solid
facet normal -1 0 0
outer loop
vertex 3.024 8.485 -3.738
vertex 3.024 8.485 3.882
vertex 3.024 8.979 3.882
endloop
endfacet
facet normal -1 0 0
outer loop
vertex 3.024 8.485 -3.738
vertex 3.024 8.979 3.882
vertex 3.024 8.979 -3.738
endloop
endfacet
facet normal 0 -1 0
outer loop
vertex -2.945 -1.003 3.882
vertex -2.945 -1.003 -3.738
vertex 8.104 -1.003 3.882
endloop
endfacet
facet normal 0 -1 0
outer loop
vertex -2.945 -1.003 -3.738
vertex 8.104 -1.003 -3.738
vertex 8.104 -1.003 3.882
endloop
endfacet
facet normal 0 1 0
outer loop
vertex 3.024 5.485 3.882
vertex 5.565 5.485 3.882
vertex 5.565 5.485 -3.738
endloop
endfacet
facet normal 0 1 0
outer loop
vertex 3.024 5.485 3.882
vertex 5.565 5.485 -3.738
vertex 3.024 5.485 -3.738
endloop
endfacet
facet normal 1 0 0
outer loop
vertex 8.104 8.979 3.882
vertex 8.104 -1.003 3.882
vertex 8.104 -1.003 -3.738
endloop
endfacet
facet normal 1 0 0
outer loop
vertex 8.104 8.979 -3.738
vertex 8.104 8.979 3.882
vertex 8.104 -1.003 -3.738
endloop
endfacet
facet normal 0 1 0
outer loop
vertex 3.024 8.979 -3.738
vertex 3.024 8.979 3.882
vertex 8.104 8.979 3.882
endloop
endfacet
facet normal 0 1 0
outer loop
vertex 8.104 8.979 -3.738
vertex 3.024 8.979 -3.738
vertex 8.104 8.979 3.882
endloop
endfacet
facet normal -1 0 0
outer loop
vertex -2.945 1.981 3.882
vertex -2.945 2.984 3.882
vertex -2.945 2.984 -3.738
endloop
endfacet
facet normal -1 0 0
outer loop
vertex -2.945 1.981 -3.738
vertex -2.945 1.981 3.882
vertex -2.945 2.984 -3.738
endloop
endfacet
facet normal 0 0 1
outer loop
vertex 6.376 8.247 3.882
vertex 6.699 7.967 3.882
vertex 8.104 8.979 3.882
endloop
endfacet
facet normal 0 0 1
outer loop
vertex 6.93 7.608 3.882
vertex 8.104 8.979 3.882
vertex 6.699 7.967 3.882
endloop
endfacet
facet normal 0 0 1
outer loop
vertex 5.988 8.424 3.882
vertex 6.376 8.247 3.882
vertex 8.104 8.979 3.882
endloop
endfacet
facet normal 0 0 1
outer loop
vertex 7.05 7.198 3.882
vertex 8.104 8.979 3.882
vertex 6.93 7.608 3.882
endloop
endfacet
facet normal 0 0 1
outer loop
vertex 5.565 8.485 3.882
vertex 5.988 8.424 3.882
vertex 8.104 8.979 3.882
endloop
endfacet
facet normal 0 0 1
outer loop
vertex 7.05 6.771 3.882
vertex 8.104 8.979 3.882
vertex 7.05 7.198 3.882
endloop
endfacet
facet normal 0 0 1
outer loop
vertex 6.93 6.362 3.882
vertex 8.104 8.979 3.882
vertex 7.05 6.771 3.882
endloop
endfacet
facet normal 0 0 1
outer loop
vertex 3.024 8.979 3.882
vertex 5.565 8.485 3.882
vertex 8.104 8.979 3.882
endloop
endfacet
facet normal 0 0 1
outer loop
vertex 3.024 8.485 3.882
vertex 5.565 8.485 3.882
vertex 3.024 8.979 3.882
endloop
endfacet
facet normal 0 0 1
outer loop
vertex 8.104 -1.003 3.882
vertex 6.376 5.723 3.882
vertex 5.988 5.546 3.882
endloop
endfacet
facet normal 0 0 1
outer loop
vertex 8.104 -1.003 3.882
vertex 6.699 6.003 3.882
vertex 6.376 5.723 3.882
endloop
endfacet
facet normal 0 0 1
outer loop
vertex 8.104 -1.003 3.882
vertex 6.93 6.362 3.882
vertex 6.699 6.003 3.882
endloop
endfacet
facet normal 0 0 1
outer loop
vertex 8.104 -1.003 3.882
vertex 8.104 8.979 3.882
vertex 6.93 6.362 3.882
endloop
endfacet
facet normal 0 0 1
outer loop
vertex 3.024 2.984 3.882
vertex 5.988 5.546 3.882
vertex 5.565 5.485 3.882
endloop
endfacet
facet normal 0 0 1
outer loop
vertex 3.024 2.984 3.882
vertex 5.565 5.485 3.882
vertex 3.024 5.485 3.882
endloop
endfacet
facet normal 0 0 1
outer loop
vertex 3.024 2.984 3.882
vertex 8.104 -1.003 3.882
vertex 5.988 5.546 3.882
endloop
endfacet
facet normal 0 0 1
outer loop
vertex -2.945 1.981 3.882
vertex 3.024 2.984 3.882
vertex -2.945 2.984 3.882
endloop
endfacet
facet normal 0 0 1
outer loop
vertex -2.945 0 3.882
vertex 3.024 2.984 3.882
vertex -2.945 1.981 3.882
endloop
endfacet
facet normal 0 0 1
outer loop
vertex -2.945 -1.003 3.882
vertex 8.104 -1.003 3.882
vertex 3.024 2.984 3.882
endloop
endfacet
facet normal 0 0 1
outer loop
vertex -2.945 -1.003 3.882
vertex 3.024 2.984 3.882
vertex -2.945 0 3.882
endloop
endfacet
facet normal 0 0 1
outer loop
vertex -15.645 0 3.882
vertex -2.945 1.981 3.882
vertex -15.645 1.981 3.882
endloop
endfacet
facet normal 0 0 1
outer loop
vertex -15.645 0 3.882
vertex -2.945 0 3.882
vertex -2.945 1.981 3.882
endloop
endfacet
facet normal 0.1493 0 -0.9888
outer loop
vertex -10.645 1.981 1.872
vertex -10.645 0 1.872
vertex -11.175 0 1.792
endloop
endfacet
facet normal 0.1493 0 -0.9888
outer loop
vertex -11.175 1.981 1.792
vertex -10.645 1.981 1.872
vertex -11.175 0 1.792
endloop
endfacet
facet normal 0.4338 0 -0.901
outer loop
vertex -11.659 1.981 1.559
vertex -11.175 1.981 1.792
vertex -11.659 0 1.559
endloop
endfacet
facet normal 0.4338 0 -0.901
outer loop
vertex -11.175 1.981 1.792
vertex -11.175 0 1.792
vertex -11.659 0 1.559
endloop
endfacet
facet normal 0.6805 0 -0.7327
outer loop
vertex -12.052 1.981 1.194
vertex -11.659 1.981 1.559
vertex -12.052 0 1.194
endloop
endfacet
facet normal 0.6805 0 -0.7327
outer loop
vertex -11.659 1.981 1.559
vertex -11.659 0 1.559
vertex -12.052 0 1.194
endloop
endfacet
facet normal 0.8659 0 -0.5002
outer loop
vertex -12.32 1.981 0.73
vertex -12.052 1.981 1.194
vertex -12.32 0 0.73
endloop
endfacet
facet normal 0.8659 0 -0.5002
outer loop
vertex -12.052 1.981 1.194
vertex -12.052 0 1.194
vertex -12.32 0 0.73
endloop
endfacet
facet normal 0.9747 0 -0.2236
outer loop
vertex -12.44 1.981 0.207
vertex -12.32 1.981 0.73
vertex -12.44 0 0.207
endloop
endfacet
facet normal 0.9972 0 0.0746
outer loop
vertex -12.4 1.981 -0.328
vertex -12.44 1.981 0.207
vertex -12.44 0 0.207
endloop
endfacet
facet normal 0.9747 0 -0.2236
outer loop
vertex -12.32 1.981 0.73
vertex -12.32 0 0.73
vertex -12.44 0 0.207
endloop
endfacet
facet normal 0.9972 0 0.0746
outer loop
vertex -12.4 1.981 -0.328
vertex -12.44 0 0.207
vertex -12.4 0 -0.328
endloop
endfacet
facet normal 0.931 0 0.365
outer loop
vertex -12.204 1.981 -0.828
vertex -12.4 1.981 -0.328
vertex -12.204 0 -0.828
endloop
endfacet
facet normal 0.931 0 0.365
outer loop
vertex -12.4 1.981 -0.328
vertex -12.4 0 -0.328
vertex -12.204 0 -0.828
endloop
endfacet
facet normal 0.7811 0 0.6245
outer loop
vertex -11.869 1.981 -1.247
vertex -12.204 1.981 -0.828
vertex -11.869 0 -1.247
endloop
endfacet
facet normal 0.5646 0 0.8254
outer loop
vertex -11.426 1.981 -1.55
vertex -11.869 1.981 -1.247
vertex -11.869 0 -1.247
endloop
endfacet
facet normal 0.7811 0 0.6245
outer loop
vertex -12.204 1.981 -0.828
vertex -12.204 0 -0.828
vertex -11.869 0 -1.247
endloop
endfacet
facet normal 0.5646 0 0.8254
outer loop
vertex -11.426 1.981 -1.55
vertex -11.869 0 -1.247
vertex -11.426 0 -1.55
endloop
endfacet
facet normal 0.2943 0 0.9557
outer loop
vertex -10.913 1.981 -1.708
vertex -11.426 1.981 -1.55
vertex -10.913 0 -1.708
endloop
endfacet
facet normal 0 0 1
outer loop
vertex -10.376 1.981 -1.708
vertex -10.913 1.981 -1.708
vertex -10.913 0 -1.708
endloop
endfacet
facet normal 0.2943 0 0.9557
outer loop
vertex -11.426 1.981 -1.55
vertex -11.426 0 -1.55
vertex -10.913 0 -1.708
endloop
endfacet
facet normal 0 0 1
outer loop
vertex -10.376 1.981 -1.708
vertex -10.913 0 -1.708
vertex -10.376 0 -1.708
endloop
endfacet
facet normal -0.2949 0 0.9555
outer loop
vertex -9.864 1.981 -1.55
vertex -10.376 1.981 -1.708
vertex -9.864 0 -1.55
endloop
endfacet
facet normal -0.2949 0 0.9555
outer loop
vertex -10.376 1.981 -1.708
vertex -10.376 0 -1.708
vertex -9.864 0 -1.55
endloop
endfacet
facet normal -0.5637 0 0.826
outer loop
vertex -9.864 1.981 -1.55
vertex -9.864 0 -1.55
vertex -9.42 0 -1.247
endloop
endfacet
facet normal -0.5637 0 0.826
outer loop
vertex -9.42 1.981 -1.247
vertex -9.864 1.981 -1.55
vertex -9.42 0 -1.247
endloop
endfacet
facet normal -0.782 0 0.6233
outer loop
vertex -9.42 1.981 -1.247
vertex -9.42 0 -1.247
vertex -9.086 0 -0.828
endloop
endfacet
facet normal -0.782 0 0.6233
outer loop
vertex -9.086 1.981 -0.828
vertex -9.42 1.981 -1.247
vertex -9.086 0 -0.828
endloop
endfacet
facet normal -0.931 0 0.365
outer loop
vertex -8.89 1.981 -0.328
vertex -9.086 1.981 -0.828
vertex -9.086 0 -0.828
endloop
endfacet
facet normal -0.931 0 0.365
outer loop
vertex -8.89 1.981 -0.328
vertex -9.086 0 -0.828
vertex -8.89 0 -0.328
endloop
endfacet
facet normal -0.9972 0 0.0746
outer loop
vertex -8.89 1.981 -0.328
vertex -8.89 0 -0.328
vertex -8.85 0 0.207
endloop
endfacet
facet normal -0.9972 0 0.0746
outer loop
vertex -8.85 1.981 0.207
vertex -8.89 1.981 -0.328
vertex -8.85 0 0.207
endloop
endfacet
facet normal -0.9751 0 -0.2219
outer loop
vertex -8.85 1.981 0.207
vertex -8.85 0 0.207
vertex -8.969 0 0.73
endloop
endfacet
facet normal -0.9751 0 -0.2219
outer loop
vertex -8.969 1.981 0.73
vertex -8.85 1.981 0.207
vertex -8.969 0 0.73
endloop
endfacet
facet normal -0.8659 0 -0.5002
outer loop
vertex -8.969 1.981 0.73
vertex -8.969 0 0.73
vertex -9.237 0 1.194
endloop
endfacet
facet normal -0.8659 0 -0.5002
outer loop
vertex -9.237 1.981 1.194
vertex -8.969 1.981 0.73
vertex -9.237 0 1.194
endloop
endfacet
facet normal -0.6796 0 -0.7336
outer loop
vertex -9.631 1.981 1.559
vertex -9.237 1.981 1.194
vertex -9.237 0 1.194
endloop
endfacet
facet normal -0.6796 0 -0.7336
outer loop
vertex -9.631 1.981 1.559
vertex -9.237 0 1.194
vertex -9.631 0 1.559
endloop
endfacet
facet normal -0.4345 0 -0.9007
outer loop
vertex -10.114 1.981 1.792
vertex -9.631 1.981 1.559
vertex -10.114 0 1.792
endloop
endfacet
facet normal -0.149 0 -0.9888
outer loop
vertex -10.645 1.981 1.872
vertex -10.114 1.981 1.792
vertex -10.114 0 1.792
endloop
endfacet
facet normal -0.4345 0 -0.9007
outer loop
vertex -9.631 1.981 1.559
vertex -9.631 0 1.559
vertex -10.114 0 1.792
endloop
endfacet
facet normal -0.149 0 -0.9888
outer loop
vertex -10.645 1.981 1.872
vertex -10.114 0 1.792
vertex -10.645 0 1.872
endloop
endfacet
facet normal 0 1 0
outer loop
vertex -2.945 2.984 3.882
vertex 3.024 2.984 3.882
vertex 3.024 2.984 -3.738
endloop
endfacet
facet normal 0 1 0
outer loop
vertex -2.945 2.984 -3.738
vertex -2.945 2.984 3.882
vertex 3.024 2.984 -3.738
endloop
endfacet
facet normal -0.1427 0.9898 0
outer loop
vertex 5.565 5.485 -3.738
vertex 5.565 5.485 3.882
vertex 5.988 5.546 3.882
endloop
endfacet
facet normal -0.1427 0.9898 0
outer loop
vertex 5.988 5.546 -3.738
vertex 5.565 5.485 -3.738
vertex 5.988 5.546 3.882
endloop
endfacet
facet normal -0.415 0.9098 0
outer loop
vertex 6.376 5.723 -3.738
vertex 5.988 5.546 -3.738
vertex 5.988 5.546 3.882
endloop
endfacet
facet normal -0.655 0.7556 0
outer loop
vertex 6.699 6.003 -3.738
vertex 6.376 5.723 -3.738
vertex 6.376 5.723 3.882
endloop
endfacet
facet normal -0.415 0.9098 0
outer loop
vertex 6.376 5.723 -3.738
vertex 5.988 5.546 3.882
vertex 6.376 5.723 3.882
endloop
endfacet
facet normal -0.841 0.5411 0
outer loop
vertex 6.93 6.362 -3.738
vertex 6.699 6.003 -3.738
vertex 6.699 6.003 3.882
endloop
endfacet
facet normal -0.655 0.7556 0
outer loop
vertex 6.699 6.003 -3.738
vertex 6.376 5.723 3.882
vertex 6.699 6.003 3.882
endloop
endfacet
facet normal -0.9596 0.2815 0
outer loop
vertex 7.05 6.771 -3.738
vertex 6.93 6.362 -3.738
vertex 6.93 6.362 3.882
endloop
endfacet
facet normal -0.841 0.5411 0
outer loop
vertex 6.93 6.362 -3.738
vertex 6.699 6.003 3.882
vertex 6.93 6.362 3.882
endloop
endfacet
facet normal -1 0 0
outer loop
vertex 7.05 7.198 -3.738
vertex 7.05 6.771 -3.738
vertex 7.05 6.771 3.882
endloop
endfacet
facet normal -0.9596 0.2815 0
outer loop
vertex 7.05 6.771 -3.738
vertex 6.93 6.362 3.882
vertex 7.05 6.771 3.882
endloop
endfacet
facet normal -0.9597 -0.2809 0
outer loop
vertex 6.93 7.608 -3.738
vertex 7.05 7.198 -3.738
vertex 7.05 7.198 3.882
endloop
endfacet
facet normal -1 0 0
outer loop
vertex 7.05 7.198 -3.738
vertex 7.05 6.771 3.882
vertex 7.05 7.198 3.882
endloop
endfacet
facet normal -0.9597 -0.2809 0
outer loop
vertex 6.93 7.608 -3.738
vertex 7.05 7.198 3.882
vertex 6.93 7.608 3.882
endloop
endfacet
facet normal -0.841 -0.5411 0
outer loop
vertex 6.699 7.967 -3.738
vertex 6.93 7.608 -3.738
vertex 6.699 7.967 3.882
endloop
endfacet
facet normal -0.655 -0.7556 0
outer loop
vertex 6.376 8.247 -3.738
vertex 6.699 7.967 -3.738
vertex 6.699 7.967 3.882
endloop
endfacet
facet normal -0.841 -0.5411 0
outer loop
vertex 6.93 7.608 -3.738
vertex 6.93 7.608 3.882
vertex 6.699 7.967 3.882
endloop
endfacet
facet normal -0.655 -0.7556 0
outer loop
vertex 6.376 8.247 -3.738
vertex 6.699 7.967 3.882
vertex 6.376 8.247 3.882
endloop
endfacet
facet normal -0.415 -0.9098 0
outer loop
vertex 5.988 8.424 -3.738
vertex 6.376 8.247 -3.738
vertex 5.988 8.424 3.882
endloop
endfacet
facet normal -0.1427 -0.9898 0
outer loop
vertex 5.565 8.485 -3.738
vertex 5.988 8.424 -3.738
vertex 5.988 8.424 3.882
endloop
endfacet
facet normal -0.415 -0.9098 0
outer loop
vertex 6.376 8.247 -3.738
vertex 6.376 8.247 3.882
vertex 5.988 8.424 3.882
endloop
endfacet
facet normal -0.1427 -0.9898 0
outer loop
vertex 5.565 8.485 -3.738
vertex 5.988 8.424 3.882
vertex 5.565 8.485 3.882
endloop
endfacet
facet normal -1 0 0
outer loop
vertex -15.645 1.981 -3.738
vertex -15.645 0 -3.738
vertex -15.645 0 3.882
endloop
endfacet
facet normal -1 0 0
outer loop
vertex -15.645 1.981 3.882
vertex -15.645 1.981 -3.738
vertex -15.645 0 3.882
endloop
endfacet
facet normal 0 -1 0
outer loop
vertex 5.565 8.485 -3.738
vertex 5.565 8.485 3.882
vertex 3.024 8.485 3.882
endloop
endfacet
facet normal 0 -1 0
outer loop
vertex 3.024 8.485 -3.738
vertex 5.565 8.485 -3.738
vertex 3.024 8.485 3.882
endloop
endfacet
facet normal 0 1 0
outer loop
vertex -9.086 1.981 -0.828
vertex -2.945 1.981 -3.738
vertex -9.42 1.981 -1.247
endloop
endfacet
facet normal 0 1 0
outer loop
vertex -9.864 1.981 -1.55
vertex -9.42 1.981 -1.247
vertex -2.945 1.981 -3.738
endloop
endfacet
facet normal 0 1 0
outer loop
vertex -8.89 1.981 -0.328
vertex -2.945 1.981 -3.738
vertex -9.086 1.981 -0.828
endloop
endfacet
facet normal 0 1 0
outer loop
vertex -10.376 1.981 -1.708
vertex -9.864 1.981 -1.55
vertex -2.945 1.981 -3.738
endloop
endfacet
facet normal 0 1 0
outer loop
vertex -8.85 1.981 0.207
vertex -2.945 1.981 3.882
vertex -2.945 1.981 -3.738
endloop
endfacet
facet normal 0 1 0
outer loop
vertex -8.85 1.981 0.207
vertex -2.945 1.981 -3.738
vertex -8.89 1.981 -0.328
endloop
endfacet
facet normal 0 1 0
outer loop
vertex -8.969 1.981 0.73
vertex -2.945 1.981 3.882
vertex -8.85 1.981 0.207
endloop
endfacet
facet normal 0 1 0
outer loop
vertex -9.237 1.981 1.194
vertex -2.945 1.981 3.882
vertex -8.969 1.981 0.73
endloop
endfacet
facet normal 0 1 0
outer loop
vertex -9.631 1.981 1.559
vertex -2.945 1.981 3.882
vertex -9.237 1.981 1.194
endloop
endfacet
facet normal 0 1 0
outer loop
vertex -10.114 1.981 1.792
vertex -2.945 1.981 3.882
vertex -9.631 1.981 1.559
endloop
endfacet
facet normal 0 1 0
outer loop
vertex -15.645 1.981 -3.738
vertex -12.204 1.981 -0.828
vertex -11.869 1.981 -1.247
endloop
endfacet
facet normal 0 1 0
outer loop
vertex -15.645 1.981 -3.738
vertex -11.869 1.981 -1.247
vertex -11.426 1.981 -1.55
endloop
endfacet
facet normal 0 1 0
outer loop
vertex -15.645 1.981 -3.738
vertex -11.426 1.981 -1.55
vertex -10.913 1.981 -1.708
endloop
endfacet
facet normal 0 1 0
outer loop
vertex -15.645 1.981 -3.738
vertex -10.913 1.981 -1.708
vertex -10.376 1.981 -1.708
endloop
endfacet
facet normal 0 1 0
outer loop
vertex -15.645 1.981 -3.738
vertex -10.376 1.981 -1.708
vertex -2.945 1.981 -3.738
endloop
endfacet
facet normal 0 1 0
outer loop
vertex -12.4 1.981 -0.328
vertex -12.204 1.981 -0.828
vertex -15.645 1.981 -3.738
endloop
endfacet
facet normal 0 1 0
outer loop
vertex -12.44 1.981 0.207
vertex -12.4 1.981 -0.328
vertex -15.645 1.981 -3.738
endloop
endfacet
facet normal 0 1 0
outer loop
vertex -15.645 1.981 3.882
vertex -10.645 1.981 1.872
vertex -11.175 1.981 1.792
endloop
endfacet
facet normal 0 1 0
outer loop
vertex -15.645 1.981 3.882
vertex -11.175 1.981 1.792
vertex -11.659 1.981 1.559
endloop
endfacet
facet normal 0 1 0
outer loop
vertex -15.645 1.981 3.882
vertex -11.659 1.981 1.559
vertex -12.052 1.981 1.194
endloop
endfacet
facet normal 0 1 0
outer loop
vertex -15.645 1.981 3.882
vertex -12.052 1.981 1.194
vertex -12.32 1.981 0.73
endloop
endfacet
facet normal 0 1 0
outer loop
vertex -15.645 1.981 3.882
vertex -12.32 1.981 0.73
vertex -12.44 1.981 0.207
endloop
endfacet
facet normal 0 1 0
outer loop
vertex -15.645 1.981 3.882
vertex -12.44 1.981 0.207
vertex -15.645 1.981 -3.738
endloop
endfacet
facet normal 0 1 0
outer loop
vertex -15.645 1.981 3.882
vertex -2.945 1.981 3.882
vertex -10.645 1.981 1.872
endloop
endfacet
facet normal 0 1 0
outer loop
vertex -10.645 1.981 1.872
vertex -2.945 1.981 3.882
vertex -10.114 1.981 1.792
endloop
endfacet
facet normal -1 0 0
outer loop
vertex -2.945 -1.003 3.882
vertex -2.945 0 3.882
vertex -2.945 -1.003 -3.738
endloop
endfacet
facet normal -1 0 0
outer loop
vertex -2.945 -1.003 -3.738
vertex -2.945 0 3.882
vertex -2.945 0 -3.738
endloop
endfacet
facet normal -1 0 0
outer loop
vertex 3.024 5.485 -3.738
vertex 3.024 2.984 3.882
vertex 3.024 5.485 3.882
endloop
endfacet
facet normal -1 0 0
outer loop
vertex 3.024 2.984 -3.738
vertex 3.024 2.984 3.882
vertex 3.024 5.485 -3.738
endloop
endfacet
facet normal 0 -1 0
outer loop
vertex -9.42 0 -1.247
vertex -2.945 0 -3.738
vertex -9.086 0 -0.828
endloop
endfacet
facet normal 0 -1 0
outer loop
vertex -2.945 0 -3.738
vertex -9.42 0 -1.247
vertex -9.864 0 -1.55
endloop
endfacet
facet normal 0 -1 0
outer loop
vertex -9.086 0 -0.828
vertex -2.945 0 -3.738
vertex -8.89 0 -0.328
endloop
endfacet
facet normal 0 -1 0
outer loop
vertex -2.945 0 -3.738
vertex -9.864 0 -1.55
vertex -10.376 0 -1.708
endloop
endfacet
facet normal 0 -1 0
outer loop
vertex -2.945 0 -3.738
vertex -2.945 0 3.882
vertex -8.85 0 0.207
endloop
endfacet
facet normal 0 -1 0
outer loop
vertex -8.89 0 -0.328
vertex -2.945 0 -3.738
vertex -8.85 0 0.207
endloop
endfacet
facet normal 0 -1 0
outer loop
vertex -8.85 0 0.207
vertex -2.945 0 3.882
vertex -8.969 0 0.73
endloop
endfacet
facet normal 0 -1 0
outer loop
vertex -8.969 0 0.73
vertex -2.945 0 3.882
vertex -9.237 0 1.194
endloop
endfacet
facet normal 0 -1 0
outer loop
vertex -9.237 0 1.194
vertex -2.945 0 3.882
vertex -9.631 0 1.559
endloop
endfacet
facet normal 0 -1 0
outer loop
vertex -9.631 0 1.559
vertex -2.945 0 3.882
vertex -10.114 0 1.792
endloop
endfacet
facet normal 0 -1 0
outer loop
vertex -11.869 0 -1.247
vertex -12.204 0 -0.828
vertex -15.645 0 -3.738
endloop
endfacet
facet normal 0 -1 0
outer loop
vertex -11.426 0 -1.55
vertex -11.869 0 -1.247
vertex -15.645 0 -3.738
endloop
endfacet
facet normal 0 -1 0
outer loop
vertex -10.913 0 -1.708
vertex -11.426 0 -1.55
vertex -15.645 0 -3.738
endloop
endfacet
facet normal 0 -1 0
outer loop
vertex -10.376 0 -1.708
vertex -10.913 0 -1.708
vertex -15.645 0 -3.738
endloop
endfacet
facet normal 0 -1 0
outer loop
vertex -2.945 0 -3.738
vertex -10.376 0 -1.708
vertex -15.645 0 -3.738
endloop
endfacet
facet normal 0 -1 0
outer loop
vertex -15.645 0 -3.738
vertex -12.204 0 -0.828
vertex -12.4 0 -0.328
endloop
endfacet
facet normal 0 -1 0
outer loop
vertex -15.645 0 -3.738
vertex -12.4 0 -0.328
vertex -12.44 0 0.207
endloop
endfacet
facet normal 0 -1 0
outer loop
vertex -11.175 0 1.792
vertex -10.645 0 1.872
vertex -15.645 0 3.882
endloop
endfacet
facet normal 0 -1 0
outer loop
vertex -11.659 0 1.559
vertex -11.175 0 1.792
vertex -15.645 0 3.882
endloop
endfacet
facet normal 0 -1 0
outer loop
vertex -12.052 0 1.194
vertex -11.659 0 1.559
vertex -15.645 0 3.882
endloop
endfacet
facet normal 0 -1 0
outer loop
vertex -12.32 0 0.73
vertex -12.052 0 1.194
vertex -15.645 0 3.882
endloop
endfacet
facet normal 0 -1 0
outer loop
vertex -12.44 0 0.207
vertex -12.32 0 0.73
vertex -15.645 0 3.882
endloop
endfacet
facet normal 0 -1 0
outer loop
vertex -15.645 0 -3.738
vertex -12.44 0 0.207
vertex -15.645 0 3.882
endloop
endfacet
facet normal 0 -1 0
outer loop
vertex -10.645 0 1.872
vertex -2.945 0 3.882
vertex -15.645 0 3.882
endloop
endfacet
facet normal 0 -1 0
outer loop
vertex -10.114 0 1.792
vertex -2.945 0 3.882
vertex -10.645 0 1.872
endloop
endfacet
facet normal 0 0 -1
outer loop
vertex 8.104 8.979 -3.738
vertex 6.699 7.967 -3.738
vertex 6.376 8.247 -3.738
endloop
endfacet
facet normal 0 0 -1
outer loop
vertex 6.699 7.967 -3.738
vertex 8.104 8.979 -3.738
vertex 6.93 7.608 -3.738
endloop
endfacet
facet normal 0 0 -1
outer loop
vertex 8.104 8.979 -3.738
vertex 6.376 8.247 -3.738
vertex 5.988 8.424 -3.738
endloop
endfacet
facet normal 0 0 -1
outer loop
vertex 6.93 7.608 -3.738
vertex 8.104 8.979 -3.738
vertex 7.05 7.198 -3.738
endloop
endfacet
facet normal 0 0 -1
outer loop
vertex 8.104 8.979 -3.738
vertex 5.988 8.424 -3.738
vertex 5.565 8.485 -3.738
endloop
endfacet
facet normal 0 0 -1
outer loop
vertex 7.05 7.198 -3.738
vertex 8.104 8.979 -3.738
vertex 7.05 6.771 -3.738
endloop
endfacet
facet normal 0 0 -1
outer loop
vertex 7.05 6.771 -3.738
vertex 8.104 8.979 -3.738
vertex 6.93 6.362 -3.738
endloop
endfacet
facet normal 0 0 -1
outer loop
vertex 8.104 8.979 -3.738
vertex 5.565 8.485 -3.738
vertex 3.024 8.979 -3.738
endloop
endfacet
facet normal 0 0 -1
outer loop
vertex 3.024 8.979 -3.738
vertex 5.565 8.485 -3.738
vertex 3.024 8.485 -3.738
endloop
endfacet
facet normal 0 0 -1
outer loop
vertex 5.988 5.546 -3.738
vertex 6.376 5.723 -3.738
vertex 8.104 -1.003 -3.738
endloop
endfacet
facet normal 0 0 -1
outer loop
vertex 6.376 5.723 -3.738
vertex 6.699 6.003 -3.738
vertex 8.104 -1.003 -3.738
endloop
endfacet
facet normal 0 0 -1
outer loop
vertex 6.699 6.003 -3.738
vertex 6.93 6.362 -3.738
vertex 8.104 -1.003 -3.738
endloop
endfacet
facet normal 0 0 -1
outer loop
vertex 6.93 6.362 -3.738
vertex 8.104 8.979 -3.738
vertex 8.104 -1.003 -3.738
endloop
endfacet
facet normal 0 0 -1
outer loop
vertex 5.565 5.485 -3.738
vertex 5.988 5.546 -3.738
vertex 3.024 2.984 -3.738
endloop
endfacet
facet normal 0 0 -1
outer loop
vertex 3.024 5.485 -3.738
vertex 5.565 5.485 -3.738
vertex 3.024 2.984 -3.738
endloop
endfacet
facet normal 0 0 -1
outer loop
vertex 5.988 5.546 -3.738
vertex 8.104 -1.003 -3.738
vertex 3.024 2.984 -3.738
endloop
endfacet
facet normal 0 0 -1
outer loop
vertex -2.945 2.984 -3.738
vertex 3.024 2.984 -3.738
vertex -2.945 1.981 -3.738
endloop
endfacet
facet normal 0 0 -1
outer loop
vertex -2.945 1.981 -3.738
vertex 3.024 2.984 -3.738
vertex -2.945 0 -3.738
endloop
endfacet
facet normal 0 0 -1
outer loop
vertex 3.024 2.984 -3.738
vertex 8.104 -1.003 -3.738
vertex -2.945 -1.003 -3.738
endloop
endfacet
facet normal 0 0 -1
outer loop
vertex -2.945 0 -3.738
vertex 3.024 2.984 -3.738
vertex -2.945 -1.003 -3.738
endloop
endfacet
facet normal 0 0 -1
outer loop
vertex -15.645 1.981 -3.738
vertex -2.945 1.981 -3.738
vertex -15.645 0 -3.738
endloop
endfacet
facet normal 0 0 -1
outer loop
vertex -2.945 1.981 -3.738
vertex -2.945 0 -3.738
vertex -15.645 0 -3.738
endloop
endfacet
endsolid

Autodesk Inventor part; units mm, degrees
ref_plane "YZ Plane" through (0, 0, 0) normal (1, 0, 0) x (0, 1, 0)
ref_plane "XZ Plane" through (0, 0, 0) normal (0, 1, 0) x (-1, 0, 0)
ref_plane "XY Plane" through (0, 0, 0) normal (0, 0, 1) x (1, 0, 0)
sketch "Sketch1" plane through (0, 0, 0) normal (0, 1, 0) x (-1, 0, 0)
  line L0 (15.6447, 3.8822) -> (-8.1043, 3.8822)
  line L1 (-8.1043, 3.8822) -> (-8.1043, -3.7378)
  line L2 (-8.1043, -3.7378) -> (15.6447, -3.7378)
  line L3 (15.6447, -3.7378) -> (15.6447, 3.8822)
  point P0 (0, 0)
  dimension "d0" = 23.749
  dimension "d1" = 7.62
extrude "Extrusion1" add sketch "Sketch1" along normal blind 1.9812
sketch "Sketch2" plane through (8.1043, 0, 3.8822) normal (1, 0, 0) x (0, 0, -1)
  line L0 (0, 0) -> (0, 1.9812) projected
  line L1 (0, 0.9906) -> (0, 2.9845)
  line L2 (0, 2.9845) -> (7.62, 2.9845)
  line L3 (7.62, 2.9845) -> (7.62, -1.0033)
  line L4 (7.62, -1.0033) -> (0, -1.0033)
  line L5 (0, -1.0033) -> (0, 2.9845)
  point P0 (3.8822, 0)
  dimension "d4" = 1.9939
  dimension "d5" = 3.9878
extrude "Extrusion2" add sketch "Sketch2" against normal blind 11.049
sketch "Sketch3" plane through (8.1043, 2.9845, 3.8822) normal (0, 1, 0) x (1, 0, 0)
  line L0 (0, 0) -> (0, 7.62) projected
  line L1 (0, 7.62) -> (-11.049, 7.62) projected
  line L2 (0, 0) -> (-5.08, 0)
  line L3 (-5.08, 0) -> (-5.08, 7.62)
  line L4 (-5.08, 7.62) -> (0, 7.62)
  line L5 (0, 7.62) -> (0, 0)
  point P0 (-8.1043, 3.8822)
  dimension "d8" = 5.08
extrude "Extrusion3" add sketch "Sketch3" along normal blind 5.9944
sketch "Sketch4" plane through (-15.6447, 0, 3.8822) normal (0, 0, 1) x (1, 0, 0)
  line L0 (18.669, 2.9845) -> (18.669, 8.9789) projected
  line L1 (18.669, 8.9789) -> (18.669, 6.9849)
  line L2 (18.669, 6.9849) -> (21.21, 6.9849)
  circle A0 centre (21.21, 6.9849) radius 1.5
  line L3 (21.21, 8.4849) -> (18.669, 8.4849)
  line L4 (21.21, 5.4849) -> (18.669, 5.4849)
  line L5 (18.669, 8.4849) -> (18.669, 5.4849)
  point P0 (15.6447, 0)
  dimension "d11" = 1.994
  dimension "d12" = 2.541
  dimension "d13" = 3
extrude "Extrusion4" cut sketch "Sketch4" against normal blind 10
sketch "Sketch5" plane through (0, 1.9812, 0) normal (0, 1, 0) x (1, 0, 0)
  line L0 (-15.6447, 3.7378) -> (-15.6447, -3.8822) projected
  line L1 (-15.6447, -0.0722) -> (-10.6447, -0.0722)
  point P0 (0, 0)
  dimension "d16" = 5
hole "Hole1" at (-10.6447, 1.9812, 0.0722) direction (0, -1, 0) diameter 3.6 end through all clearance for "Flat Head Machine Screw" size "M3" standard "Ansi Metric M Profile"
properties part number "end axle"
